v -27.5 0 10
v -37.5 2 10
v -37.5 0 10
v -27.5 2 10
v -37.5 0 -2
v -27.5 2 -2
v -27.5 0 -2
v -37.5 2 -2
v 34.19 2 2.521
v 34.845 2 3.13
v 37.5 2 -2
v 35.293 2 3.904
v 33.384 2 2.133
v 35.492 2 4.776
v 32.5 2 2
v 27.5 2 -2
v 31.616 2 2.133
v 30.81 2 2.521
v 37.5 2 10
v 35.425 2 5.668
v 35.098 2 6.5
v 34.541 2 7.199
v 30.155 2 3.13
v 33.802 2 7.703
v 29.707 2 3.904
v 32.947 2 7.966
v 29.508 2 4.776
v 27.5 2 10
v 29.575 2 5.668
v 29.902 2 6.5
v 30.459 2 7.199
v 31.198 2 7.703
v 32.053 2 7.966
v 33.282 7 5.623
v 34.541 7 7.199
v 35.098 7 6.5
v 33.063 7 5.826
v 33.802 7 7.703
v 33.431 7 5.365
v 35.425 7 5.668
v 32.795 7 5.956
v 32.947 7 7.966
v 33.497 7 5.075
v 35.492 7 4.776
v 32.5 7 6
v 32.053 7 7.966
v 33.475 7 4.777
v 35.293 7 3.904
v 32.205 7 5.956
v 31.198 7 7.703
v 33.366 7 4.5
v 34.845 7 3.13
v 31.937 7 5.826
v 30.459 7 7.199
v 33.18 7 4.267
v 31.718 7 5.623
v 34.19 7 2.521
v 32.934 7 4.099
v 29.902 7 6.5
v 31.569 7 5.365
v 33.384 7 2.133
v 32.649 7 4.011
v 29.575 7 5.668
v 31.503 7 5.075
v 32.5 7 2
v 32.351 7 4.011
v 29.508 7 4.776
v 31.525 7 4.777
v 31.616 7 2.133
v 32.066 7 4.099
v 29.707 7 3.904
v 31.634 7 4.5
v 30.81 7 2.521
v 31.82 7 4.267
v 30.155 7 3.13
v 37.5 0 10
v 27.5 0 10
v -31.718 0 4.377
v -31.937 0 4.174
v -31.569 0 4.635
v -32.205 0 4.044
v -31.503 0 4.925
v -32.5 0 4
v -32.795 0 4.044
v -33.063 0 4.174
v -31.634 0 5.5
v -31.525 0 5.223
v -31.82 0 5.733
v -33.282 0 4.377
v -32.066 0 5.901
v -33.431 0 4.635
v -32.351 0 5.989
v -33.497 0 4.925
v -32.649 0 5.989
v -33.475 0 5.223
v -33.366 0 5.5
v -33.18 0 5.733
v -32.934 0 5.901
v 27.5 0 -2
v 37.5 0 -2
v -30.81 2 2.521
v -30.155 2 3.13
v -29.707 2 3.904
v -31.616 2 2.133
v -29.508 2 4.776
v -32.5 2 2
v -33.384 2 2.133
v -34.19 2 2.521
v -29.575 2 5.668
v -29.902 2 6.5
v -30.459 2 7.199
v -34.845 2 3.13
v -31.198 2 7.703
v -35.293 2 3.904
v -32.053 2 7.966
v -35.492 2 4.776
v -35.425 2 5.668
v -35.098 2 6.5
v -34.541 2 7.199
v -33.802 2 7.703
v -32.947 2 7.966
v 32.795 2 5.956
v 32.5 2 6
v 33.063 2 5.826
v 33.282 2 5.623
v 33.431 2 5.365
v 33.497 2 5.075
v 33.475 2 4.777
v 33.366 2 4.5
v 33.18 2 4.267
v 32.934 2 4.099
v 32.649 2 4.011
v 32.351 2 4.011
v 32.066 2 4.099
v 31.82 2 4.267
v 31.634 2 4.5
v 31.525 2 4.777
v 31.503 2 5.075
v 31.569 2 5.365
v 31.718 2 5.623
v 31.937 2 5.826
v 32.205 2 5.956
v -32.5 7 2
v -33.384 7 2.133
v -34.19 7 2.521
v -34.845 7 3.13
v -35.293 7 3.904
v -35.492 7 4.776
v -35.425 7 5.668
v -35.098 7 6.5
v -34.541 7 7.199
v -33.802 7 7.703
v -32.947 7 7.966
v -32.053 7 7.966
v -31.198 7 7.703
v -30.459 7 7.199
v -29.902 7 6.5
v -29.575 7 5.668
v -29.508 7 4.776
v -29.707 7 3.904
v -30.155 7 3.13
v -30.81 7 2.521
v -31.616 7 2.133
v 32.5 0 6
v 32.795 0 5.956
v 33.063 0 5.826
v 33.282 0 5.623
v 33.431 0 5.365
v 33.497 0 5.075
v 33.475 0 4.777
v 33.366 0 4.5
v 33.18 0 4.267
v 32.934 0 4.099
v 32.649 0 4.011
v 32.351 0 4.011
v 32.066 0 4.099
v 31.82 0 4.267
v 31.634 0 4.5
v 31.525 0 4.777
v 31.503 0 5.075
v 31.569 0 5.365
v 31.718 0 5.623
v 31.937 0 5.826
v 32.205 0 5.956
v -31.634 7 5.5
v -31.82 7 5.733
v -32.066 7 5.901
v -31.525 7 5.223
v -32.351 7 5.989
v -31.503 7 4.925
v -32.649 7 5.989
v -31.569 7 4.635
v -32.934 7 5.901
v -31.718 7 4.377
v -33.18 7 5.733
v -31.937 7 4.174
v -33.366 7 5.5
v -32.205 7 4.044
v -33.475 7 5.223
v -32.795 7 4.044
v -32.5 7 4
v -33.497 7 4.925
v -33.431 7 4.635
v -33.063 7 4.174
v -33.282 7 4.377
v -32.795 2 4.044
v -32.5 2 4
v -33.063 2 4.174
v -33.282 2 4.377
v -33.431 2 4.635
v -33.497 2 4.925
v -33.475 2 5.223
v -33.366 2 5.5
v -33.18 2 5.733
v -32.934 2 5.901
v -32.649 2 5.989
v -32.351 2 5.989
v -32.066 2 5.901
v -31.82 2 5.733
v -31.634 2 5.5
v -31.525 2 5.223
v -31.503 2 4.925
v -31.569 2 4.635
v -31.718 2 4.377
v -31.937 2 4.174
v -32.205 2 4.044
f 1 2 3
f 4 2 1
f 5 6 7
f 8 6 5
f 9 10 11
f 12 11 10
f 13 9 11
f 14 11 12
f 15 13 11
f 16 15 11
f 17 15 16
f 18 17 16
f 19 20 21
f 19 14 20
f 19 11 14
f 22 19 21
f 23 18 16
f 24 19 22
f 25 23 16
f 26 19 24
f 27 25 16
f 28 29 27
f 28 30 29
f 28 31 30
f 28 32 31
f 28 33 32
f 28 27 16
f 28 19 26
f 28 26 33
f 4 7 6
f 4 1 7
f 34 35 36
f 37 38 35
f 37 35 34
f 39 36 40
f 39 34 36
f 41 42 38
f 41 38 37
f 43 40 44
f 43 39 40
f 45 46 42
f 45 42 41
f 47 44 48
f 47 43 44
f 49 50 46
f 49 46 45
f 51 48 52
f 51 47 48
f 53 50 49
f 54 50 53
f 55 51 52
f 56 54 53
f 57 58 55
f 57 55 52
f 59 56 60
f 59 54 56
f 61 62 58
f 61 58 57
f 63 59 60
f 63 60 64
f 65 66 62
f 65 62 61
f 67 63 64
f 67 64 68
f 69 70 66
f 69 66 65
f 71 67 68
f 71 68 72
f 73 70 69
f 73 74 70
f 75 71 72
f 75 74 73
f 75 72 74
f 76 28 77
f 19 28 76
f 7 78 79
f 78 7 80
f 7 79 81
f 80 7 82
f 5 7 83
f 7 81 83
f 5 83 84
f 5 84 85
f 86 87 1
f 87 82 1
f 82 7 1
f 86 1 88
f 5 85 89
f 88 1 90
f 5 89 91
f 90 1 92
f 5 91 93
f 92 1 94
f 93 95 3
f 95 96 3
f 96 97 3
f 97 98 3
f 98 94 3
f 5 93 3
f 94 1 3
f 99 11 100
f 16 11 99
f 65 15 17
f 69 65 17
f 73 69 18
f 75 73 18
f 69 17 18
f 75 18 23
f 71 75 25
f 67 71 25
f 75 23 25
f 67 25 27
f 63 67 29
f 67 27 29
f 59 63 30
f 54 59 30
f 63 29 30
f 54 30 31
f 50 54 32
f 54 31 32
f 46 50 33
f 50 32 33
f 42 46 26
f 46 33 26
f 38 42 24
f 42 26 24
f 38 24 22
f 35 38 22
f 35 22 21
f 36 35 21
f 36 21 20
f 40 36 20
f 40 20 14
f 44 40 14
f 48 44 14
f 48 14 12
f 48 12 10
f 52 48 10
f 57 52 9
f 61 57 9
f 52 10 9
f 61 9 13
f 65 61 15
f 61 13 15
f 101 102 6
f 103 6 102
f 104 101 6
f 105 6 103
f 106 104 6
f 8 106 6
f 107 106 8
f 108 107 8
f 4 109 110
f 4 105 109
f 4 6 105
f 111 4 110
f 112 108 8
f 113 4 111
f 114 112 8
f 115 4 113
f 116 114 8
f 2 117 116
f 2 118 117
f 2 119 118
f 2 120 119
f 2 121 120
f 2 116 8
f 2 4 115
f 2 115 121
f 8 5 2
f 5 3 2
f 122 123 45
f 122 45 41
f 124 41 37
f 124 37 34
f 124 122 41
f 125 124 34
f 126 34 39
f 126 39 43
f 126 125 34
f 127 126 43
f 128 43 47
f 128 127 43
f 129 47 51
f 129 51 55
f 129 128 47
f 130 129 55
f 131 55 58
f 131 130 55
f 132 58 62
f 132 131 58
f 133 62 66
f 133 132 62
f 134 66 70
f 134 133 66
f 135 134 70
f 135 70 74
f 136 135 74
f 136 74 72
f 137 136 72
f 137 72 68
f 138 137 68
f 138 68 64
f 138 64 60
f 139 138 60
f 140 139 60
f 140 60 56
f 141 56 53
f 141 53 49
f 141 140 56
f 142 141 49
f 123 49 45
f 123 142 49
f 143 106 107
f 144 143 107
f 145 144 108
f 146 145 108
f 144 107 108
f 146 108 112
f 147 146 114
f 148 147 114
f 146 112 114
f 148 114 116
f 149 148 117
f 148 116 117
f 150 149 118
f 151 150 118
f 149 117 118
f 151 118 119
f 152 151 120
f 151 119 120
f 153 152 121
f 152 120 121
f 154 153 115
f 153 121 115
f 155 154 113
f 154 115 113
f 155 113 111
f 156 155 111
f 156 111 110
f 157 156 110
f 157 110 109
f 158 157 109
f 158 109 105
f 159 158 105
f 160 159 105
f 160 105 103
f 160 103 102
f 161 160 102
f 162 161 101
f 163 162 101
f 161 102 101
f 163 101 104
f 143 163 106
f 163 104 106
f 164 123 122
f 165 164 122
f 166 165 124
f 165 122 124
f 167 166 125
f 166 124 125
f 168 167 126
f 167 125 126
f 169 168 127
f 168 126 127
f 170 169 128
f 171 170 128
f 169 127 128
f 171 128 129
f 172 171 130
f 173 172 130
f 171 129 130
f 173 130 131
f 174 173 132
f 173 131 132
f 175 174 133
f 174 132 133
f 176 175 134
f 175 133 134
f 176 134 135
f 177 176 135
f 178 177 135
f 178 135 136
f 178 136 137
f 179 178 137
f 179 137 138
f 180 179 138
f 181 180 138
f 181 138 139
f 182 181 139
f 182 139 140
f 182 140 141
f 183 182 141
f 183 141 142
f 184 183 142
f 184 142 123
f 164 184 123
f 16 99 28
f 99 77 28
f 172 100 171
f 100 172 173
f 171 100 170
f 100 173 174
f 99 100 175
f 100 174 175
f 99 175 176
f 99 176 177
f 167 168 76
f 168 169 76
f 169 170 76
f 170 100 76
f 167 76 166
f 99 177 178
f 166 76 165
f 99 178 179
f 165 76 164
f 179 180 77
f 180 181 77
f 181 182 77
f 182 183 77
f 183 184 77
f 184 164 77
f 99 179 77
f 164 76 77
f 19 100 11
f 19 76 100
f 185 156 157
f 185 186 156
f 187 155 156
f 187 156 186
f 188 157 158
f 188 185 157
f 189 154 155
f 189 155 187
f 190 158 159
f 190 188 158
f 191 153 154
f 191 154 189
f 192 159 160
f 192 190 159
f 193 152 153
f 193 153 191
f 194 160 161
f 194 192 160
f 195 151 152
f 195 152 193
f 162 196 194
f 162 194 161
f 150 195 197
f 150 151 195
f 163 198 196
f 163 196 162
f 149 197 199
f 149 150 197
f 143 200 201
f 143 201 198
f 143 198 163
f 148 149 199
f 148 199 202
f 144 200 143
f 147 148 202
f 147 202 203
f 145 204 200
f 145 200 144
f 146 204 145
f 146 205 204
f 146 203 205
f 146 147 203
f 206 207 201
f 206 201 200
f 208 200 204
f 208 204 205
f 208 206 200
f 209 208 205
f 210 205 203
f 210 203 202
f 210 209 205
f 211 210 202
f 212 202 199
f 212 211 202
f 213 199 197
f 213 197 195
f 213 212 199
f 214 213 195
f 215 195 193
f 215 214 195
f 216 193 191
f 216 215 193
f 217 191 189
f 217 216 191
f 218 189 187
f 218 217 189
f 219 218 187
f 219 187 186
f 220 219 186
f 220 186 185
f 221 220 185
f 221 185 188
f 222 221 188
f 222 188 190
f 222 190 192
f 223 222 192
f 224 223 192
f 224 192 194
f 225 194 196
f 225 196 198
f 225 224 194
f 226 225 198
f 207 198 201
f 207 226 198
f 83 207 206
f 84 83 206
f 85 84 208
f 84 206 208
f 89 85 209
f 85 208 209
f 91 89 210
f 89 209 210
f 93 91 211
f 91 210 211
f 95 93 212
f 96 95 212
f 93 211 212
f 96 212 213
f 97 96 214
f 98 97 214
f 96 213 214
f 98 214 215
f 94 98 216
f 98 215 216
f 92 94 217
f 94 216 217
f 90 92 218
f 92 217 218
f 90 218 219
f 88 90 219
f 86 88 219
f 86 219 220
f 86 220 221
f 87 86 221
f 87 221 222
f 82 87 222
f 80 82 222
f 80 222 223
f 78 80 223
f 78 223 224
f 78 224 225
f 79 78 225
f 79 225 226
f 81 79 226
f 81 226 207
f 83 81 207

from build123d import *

# Parameters (mm, degrees)
SKETCH1_W           = 75
SKETCH1_H           = 2
BOSS_EXTRUDE1_DEPTH = 10
SKETCH2_R           = 3
SKETCH2_R_2         = 1
BOSS_EXTRUDE2_DEPTH = 5
SKETCH3_R           = 1
CUT_EXTRUDE1_DEPTH  = 40.131189606
SKETCH4_W           = 55
SKETCH4_H           = 10
CUT_EXTRUDE2_DEPTH  = 10
SKETCH5_W           = 10
SKETCH5_H           = 2
BOSS_EXTRUDE3_DEPTH = 2
SKETCH6_W           = 10
SKETCH6_H           = 2
BOSS_EXTRUDE4_DEPTH = 2


with BuildPart() as part:
    # Sketch1 → Boss-Extrude1 (new body)
    with BuildSketch(Plane.XY):
        with Locations((0, 1)):
            Rectangle(SKETCH1_W, SKETCH1_H)
    extrude(amount=BOSS_EXTRUDE1_DEPTH)

    # Sketch2 → Boss-Extrude2 (add)
    # profile 1 of 2: a face of its own
    with BuildSketch(Plane(origin=(0, 2, 0), x_dir=(1, 0, 0), z_dir=(0, 1, 0))):
        with Locations(Location((32.5, -5, 0), (0, 0, 90))):
            Circle(SKETCH2_R)
        with Locations(Location((32.5, -5, 0), (0, 0, 270))):
            Circle(SKETCH2_R_2, mode=Mode.SUBTRACT)
    # profile 2 of 2: a face of its own
    with BuildSketch(Plane(origin=(0, 2, 0), x_dir=(1, 0, 0), z_dir=(0, 1, 0))):
        with Locations(Location((-32.5, -5, 0), (0, 0, 90))):
            Circle(SKETCH2_R)
        with Locations(Location((-32.5, -5, 0), (0, 0, 90))):
            Circle(SKETCH2_R_2, mode=Mode.SUBTRACT)
    extrude(amount=BOSS_EXTRUDE2_DEPTH)

    # Sketch3 → Cut-Extrude1 (cut, through all)
    with BuildSketch(Plane(origin=(0, 2, 0), x_dir=(1, 0, 0), z_dir=(0, 1, 0))):
        with Locations(Location((32.5, -5, 0), (0, 0, 270))):
            Circle(SKETCH3_R)
        with Locations(Location((-32.5, -5, 0), (0, 0, 90))):
            Circle(SKETCH3_R)
    extrude(amount=-CUT_EXTRUDE1_DEPTH, mode=Mode.SUBTRACT)

    # Sketch4 → Cut-Extrude2 (cut)
    with BuildSketch(Plane(origin=(0, 2, 0), x_dir=(1, 0, 0), z_dir=(0, 1, 0))):
        with Locations((0, -5)):
            Rectangle(SKETCH4_W, SKETCH4_H)
    extrude(amount=-CUT_EXTRUDE2_DEPTH, mode=Mode.SUBTRACT)


with BuildPart() as cut_extrude2_piece_1:
    # of the separate pieces the step leaves, piece 1, a body of its own (cut_extrude2_pieces)
    add(part.part.solids().sort_by_distance((27.5, 0, 0))[0])

    # Sketch5 → Boss-Extrude3 (add)
    with BuildSketch(Plane(origin=(0, 0, 0), x_dir=(-1, 0, 0), z_dir=(0, 0, -1))):
        with Locations((-32.5, 1)):
            Rectangle(SKETCH5_W, SKETCH5_H)
    extrude(amount=BOSS_EXTRUDE3_DEPTH)


with BuildPart() as cut_extrude2_piece_2:
    # of the separate pieces the step leaves, piece 2, a body of its own (cut_extrude2_pieces)
    add(part.part.solids().sort_by_distance((-37.5, 0, 0))[0])

    # Sketch6 → Boss-Extrude4 (add)
    with BuildSketch(Plane(origin=(0, 0, 0), x_dir=(-1, 0, 0), z_dir=(0, 0, -1))):
        with Locations((32.5, 1)):
            Rectangle(SKETCH6_W, SKETCH6_H)
    extrude(amount=BOSS_EXTRUDE4_DEPTH)


solid = Compound([cut_extrude2_piece_1.part, cut_extrude2_piece_2.part])
